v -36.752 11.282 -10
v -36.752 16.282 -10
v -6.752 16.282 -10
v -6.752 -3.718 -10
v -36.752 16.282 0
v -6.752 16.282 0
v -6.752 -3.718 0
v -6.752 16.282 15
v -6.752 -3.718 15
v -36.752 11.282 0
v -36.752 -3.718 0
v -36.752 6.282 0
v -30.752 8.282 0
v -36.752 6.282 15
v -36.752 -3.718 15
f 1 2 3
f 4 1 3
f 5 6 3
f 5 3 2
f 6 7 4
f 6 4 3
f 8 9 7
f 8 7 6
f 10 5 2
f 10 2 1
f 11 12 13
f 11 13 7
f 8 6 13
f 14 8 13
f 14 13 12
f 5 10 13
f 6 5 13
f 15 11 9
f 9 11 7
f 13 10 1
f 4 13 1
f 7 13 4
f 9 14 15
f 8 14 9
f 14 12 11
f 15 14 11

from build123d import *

# Parameters (mm, degrees)
BOSS_EXTRUDE1_DEPTH = 15
BOSS_EXTRUDE2_DEPTH = 10


with BuildPart() as part:
    # Sketch1 → Boss-Extrude1 (new body)
    with BuildSketch(Plane.XY):
        Polygon((-36.752136752, 6.282051282), (-36.752136752, -3.717948718), (-6.752136752, -3.717948718), (-6.752136752, 16.282051282), align=None)
    extrude(amount=BOSS_EXTRUDE1_DEPTH)

    # Sketch2 → Boss-Extrude2 (add)
    with BuildSketch(Plane(origin=(0, 0, 0), x_dir=(-1, 0, 0), z_dir=(0, 0, -1))):
        Polygon((6.752136752, -3.717948718), (6.752136752, 16.282051282), (36.752136752, 16.282051282), (36.752136752, 11.282051282), align=None)
    extrude(amount=BOSS_EXTRUDE2_DEPTH)


solid = part.part
